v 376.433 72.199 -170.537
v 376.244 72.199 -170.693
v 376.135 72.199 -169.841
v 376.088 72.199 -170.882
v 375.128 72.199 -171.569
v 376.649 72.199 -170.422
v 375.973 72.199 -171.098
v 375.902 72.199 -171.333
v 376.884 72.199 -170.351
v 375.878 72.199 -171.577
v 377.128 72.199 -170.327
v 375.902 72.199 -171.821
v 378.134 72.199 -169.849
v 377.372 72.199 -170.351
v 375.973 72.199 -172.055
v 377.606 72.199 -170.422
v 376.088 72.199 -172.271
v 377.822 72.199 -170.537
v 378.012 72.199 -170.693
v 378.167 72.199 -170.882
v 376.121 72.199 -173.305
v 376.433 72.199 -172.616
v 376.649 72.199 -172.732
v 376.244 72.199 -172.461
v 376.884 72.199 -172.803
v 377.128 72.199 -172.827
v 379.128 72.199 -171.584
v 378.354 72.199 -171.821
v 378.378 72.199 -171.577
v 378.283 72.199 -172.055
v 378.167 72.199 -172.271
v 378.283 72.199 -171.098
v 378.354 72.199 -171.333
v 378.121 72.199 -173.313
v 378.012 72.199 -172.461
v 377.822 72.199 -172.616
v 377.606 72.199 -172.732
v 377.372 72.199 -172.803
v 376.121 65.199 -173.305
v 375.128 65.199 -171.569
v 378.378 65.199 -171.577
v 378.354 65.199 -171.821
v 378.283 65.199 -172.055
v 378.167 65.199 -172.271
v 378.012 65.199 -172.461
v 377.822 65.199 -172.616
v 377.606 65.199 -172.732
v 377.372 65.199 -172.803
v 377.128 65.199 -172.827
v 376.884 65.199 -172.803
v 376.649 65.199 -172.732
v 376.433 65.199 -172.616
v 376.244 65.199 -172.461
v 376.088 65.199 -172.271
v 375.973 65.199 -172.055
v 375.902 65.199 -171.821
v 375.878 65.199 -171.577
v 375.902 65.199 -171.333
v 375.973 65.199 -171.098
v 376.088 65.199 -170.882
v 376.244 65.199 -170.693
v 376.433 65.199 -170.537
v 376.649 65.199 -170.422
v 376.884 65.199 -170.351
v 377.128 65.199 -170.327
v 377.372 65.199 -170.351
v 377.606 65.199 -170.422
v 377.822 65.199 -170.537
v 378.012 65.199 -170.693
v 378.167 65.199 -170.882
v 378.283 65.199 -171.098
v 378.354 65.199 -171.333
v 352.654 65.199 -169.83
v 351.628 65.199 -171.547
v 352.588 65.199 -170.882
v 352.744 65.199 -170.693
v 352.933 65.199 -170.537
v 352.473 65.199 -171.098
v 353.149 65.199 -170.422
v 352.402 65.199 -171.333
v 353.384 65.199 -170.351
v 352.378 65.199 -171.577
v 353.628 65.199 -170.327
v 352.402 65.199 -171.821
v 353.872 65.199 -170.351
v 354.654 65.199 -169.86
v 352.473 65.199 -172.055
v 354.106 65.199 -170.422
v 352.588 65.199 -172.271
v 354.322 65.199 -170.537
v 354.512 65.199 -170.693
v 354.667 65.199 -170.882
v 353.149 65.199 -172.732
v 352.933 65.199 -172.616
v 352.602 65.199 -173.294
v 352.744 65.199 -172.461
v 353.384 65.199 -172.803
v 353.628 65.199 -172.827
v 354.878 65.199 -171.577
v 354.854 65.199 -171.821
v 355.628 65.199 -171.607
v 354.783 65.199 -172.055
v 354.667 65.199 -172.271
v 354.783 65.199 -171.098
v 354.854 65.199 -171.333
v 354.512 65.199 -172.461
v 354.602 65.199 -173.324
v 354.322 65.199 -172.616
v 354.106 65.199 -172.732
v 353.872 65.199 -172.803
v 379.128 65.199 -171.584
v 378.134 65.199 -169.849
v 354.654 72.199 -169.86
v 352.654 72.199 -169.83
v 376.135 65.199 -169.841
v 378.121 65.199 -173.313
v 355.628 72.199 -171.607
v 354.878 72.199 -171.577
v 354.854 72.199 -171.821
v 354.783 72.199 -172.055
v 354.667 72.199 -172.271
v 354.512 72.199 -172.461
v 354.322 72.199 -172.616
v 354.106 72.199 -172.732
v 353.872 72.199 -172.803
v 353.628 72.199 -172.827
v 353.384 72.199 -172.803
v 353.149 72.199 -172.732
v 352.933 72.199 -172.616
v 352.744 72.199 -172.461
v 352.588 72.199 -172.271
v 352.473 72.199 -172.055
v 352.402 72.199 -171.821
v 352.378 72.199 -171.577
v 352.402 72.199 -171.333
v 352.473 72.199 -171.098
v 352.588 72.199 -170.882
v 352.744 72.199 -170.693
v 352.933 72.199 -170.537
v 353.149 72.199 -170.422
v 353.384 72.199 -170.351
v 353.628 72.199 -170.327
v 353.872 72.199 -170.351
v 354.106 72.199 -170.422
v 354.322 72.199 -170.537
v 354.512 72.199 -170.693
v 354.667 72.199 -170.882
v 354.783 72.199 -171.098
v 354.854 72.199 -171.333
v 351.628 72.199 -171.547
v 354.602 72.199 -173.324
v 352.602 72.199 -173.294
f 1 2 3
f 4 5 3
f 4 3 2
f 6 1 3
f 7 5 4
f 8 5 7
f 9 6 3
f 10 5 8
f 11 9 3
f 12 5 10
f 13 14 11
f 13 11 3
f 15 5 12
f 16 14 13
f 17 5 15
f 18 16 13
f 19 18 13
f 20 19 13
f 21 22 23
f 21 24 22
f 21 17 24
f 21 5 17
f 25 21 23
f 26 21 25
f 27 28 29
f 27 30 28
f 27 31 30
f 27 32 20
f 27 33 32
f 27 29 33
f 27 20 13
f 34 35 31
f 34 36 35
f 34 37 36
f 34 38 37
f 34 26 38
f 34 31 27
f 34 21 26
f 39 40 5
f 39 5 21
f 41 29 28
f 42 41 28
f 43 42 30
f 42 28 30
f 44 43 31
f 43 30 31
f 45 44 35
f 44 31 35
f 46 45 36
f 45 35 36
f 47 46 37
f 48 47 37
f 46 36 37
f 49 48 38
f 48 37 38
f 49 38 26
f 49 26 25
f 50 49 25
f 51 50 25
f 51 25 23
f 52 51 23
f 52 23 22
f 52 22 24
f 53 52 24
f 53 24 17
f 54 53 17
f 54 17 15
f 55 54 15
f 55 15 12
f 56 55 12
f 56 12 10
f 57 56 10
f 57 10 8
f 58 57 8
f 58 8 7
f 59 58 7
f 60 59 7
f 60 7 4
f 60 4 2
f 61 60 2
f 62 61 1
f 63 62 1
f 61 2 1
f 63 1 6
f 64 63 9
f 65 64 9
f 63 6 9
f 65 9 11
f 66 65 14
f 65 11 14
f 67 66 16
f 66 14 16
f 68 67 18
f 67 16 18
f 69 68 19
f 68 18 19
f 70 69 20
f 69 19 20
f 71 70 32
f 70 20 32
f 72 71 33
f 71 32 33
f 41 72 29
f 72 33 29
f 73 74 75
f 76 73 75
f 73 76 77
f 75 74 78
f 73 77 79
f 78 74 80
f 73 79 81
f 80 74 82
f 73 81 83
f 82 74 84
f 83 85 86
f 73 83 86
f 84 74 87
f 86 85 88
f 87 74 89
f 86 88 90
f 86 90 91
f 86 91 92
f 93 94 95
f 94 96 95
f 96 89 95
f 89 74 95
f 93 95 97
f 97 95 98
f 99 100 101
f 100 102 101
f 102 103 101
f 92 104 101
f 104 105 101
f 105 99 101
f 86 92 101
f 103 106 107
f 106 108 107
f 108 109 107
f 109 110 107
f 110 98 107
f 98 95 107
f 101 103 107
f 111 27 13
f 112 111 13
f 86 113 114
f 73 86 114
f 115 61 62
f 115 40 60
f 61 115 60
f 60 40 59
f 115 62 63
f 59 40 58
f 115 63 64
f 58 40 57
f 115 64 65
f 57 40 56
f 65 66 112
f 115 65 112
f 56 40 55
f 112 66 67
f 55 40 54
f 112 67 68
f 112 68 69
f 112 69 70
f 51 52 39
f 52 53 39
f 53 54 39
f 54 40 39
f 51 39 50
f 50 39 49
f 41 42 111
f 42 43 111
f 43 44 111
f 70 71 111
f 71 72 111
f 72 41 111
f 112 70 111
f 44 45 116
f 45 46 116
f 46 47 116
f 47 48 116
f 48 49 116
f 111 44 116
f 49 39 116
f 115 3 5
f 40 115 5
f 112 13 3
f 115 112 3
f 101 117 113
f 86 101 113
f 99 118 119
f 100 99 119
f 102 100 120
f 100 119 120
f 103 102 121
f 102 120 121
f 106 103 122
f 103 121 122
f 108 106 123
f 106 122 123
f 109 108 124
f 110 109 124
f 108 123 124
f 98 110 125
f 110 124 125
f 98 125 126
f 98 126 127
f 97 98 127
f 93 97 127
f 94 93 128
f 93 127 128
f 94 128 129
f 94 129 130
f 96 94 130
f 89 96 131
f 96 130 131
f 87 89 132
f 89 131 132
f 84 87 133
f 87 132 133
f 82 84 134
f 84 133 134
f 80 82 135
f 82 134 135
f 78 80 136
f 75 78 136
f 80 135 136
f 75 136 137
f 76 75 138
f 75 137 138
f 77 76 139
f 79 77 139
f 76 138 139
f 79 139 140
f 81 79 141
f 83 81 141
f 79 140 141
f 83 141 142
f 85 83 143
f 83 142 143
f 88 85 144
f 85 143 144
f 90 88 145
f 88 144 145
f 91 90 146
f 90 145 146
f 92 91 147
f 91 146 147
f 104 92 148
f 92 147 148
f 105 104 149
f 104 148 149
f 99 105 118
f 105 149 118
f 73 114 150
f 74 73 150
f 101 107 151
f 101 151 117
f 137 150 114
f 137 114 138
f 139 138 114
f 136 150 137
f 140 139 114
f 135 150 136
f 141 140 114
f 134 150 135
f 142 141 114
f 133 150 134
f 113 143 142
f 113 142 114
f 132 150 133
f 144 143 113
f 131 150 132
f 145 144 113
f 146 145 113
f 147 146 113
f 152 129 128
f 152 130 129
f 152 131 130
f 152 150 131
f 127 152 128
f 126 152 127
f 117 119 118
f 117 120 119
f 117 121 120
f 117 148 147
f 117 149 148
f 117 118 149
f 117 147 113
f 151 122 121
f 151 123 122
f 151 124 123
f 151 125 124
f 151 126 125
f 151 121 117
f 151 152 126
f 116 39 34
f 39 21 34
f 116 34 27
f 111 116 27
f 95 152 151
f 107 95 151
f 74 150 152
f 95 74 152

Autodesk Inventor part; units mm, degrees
ref_plane "YZ Plane" through (0, 0, 0) normal (1, 0, 0) x (0, 1, 0)
ref_plane "XZ Plane" through (0, 0, 0) normal (0, 1, 0) x (-1, 0, 0)
ref_plane "РабПлоскость1" through (383.3254, 72.1989, -189.0917) normal (0, 1, 0) x (1, 0, 0)
sketch "Эскиз1" plane through (383.3254, 72.1989, -189.0917) normal (0, 1, 0) x (1, 0, 0)
  circle A0 centre (-6.1976, -17.515) radius 1.3 projected
  circle A1 centre (-29.6976, -17.515) radius 1.3 projected
  circle A2 centre (-29.6976, 6.235) radius 1.3 projected
  circle A3 centre (-6.1976, -17.515) radius 2
  line L0 (-5.2043, -15.779) -> (-4.1976, -17.5072)
  line L1 (-4.1976, -17.5072) -> (-5.1909, -19.2431)
  line L2 (-5.1909, -19.2431) -> (-7.1908, -19.2509)
  line L3 (-7.1908, -19.2509) -> (-8.1976, -17.5227)
  line L4 (-8.1976, -17.5227) -> (-7.2043, -15.7868)
  line L5 (-7.2043, -15.7868) -> (-5.2043, -15.779)
  circle A4 centre (-29.6976, -17.515) radius 2
  line L6 (-28.7236, -15.7682) -> (-27.6978, -17.4851)
  line L7 (-27.6978, -17.4851) -> (-28.6718, -19.2319)
  line L8 (-28.6718, -19.2319) -> (-30.6716, -19.2617)
  line L9 (-30.6716, -19.2617) -> (-31.6974, -17.5448)
  line L10 (-31.6974, -17.5448) -> (-30.7233, -15.798)
  line L11 (-30.7233, -15.798) -> (-28.7236, -15.7682)
  circle A5 centre (-6.1976, -17.515) radius 1.25
  circle A6 centre (-29.6976, -17.515) radius 1.25
  point P0 (-383.3254, -189.0917)
  dimension "d0" = 4
  dimension "d1" = 4
  dimension "d5" = 2.5
  dimension "d6" = 2.5
ref_plane "РабПлоскость2" through (351.6278, 65.1989, -197.3267) normal (0, 1, 0) x (0, 0, 1)
extrude "Выдавливание1" add sketch "Эскиз1" against normal up to surface (7 mm away) contours A0 | A1 | L1 L2 L3 L4 L5 L0 | L7 L8 L9 L10 L11 L6
properties part number "стойка для дисплея"
